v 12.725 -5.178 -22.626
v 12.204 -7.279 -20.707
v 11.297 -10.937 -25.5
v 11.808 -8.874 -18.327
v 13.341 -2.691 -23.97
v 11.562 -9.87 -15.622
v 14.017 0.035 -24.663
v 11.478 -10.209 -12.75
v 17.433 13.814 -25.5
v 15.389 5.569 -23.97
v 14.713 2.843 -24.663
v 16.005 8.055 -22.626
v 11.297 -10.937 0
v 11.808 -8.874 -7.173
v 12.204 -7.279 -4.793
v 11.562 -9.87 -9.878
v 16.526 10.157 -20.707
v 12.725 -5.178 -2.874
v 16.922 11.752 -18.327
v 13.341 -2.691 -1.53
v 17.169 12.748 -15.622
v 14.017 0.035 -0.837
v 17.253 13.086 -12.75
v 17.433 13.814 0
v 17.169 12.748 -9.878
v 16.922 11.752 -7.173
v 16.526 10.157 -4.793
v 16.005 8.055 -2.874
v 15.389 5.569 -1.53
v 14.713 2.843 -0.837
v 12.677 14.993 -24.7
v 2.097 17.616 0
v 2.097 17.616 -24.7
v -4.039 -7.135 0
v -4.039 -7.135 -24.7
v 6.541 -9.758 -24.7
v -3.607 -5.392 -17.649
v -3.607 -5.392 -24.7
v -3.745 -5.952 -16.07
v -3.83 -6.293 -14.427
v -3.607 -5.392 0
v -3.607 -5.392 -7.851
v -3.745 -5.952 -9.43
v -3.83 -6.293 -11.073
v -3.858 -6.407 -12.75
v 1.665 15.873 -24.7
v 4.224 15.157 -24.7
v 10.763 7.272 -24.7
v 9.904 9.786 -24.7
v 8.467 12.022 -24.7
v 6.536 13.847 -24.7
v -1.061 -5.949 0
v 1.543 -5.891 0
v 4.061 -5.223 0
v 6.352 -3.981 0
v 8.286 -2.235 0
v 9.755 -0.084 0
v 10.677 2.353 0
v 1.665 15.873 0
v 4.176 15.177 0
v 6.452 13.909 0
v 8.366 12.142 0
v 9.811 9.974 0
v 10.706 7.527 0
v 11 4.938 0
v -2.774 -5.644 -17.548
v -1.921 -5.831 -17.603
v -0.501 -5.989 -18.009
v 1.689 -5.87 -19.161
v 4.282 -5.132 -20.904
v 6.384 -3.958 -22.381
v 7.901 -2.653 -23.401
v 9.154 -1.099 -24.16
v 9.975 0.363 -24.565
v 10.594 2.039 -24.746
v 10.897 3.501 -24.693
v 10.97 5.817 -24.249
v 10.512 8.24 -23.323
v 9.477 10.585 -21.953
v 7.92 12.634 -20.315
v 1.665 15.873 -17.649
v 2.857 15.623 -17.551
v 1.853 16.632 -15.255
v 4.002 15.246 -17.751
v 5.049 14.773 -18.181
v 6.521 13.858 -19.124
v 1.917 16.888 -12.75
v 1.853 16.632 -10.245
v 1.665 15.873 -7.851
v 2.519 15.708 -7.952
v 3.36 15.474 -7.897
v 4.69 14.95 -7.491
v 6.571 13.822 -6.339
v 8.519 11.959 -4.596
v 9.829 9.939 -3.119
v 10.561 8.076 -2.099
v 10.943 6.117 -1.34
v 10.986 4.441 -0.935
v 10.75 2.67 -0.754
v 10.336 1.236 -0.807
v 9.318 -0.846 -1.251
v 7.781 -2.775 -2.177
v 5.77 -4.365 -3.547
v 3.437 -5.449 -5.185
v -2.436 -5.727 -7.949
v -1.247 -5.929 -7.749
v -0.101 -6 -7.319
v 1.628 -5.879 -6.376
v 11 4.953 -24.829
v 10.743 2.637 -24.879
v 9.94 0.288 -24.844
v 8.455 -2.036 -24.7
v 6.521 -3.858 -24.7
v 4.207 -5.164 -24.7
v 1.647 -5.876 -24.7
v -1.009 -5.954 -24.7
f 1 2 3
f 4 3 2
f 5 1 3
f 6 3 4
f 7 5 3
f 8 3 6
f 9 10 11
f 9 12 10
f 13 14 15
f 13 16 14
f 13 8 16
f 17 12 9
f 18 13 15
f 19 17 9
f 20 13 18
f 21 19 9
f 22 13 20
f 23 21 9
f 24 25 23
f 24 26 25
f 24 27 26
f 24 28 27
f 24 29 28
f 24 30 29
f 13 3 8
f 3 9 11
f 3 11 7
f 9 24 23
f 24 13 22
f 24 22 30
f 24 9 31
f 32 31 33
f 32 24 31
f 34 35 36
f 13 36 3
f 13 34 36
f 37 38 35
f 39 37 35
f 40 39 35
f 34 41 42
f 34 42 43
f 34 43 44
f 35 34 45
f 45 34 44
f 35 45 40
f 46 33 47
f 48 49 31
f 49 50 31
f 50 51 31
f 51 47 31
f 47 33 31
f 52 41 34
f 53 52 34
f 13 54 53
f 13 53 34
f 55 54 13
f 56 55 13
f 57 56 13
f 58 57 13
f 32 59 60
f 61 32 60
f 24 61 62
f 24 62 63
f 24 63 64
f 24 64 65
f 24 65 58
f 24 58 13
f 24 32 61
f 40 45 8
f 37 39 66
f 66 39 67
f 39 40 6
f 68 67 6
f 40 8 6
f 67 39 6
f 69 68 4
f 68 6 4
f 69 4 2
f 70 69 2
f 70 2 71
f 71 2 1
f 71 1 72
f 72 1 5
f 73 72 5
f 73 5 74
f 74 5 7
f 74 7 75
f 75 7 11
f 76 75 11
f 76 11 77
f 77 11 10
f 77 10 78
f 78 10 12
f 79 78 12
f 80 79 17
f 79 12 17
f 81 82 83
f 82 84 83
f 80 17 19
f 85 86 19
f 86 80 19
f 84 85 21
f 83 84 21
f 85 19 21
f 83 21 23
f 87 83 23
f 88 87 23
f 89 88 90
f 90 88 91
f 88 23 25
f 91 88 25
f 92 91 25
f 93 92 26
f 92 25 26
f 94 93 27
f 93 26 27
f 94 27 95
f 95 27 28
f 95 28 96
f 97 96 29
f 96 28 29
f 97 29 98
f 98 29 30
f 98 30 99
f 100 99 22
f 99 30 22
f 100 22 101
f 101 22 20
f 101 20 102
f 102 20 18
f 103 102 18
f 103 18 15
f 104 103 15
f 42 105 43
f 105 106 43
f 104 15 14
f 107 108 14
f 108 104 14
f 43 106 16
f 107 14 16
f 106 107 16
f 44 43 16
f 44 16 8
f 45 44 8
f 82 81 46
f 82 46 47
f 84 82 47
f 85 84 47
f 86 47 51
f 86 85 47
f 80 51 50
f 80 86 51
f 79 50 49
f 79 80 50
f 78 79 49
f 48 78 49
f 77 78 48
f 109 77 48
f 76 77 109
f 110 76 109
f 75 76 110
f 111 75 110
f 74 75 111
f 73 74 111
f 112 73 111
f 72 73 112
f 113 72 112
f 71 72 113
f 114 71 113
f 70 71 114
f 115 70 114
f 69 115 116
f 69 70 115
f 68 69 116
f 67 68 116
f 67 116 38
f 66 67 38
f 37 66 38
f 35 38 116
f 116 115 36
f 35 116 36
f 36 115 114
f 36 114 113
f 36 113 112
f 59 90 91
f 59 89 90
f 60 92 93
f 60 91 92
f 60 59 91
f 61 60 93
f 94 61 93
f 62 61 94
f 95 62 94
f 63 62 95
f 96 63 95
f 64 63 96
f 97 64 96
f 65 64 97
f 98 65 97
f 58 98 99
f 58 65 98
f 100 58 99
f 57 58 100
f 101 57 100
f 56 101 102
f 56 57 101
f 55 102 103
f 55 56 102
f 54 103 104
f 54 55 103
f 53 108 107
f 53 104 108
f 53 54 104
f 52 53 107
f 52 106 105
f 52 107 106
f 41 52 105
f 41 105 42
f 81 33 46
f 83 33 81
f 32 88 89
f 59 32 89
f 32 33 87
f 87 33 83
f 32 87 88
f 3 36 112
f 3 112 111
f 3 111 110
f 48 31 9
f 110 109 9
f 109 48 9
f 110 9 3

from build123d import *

# Parameters (mm, degrees)
RESSALTO_EXTRUS_O1_DEPTH = 25.5
CORTE_EXTRUS_O1_DEPTH    = 30.19013409
ESBO_O3_R                = 12
CORTE_EXTRUS_O2_DEPTH    = 22.755596158


with BuildPart() as part:
    # Esboço1 → Ressalto-extrusão1 (new body)
    with BuildSketch(Plane.XY):
        with BuildLine():
            Line((17.433095525, 13.814174971), (2.097319146, 17.616011747))
            Line((2.097319146, 17.616011747), (1.665269548, 15.873218352))
            ThreePointArc((1.665269548, 15.873218352), (10.676806339, 2.353151612), (-3.606507064, -5.391973191))
            Line((-3.606507064, -5.391973191), (-4.038556662, -7.134766585))
            Line((-4.038556662, -7.134766585), (11.297219716, -10.936603361))
            Line((11.297219716, -10.936603361), (17.433095525, 13.814174971))
        make_face()
    extrude(amount=-RESSALTO_EXTRUS_O1_DEPTH)

    # Esboço2 → Corte-extrusão1 (cut, through all)
    with BuildSketch(Plane(origin=(4.235701857, 17.085893034, 0), x_dir=(0, 0, 1), z_dir=(0.240622581, 0.970618758, 0))):
        Polygon((-24.7, -2.203112904), (-24.7, 8.696887096), (-25.5, 13.596887096), (-25.5, -2.203112904), align=None)
    extrude(amount=-CORTE_EXTRUS_O1_DEPTH, mode=Mode.SUBTRACT)

    # Esboço3 → Corte-extrusão2 (cut, through all)
    with BuildSketch(Plane(origin=(13.197393668, -3.271718063, 0), x_dir=(-0.240622581, -0.970618758, 0), z_dir=(0.970618758, -0.240622581, 0))):
        with Locations((-4.853093791, 12.75)):
            Circle(ESBO_O3_R)
    extrude(amount=-CORTE_EXTRUS_O2_DEPTH, mode=Mode.SUBTRACT)


solid = part.part
